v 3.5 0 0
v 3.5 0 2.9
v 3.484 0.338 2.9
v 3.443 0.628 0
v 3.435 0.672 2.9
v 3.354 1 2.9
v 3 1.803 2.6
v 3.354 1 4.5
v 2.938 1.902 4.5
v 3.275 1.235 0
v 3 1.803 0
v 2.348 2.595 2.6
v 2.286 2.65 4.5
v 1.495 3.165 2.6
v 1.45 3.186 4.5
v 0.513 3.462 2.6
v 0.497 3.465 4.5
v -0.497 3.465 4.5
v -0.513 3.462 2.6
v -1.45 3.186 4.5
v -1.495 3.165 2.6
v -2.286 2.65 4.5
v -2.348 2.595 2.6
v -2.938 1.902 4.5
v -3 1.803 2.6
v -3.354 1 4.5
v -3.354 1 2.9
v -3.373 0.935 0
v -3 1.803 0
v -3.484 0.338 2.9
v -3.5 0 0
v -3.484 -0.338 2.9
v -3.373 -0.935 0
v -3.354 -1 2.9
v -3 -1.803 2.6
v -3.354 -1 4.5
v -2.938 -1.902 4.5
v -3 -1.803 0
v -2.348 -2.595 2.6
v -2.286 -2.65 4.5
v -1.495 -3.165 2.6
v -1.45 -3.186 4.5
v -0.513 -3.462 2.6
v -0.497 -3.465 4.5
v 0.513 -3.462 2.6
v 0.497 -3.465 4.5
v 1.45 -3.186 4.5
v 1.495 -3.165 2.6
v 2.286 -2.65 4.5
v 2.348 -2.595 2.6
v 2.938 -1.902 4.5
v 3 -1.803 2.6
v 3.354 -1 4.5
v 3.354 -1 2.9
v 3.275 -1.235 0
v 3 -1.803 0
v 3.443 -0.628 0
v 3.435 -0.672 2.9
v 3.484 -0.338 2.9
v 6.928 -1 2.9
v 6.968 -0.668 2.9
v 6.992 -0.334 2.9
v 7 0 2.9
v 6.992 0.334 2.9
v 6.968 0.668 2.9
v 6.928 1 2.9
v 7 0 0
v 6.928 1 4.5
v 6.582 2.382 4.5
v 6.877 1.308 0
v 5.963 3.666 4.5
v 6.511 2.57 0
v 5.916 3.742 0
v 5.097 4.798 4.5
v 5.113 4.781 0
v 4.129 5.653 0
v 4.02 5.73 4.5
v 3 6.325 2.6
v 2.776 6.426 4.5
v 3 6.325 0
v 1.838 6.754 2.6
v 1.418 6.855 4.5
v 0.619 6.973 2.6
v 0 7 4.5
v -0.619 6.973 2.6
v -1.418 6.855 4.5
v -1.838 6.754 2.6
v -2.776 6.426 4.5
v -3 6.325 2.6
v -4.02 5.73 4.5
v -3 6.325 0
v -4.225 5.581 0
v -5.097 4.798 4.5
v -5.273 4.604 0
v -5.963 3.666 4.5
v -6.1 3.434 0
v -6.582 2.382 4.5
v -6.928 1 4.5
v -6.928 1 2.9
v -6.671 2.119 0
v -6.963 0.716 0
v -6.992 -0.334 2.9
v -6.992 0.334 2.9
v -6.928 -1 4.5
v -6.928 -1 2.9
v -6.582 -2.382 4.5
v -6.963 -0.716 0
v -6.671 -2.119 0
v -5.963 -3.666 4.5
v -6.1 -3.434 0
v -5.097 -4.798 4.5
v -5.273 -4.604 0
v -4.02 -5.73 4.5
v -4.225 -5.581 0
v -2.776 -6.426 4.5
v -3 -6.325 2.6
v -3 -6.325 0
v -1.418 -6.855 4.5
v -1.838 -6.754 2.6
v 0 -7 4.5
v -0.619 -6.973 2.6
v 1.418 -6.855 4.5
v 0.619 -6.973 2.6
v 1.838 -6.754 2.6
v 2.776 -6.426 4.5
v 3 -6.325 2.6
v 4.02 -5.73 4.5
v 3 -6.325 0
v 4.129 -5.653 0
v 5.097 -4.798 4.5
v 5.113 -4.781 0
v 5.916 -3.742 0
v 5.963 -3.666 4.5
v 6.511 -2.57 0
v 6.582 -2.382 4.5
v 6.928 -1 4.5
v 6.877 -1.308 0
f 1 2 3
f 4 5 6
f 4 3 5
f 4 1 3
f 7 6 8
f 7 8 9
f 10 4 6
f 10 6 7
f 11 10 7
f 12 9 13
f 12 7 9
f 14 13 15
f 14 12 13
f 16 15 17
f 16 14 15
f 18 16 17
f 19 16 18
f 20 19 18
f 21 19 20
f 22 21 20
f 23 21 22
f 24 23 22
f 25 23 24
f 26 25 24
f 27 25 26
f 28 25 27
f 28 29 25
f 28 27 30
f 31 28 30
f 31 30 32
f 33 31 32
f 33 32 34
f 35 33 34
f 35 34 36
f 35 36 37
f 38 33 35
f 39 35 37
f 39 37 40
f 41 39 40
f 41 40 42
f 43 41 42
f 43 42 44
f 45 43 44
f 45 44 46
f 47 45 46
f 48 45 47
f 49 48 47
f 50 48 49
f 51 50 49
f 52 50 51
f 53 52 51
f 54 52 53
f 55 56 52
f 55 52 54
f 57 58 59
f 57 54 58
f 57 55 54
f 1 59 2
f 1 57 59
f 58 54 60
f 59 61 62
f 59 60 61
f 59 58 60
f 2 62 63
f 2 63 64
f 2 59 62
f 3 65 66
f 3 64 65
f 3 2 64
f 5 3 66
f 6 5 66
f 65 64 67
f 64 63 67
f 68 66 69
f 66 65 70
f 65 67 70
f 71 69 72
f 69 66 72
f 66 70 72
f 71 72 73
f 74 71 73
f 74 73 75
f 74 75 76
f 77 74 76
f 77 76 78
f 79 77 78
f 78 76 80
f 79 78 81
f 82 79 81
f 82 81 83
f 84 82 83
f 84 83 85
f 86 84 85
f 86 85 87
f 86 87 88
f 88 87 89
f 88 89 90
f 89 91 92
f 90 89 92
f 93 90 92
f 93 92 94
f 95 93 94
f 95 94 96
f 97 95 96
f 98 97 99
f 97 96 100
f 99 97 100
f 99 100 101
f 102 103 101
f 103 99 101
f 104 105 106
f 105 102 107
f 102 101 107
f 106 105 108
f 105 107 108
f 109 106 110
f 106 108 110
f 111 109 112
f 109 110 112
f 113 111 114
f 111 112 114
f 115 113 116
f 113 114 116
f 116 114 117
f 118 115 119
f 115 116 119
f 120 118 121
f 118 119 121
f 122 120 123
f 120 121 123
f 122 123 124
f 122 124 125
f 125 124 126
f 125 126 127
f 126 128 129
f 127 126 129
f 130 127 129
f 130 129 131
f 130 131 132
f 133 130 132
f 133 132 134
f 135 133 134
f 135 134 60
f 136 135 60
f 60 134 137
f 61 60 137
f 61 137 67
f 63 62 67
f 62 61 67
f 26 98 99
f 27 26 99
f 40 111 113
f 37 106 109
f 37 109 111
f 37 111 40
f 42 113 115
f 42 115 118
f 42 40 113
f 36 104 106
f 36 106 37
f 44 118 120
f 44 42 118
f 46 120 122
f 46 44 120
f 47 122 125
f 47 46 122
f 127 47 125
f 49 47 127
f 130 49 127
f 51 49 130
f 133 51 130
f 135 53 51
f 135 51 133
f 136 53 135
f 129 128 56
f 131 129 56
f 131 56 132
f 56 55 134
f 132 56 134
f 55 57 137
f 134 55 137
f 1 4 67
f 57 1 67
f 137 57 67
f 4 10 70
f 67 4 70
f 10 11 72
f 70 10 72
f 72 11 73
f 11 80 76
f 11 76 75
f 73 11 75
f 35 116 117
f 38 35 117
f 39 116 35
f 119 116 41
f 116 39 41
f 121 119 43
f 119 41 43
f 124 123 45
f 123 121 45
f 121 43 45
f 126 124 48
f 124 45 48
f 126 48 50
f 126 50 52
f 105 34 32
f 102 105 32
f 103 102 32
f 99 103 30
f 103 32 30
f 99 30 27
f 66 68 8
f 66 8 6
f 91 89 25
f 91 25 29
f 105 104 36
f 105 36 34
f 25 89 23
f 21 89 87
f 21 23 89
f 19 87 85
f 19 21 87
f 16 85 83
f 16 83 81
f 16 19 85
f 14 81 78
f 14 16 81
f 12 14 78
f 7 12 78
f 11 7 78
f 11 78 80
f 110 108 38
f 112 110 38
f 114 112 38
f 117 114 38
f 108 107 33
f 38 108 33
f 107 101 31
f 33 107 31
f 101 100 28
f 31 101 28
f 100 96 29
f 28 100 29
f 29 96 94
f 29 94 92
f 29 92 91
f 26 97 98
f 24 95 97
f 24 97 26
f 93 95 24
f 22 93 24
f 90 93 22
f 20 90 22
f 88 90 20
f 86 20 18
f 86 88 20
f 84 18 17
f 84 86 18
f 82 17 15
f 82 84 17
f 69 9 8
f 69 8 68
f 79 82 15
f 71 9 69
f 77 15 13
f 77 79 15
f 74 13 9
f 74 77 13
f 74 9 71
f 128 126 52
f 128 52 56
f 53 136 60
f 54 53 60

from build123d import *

# Parameters (mm, degrees)
SKETCH_1_R               = 7
SKETCH_1_R_2             = 3.5
EXTRUDE_1_DEPTH          = 4.5
SKETCH_2_W               = 6
SKETCH_2_H               = 2.6
CUT_EXTRUDE_1_DEPTH      = 8
CUT_EXTRUDE_1_DEPTH_BACK = 8
SKETCH_3_W               = 1.6
SKETCH_3_H               = 2
CUT_EXTRUDE_2_DEPTH      = 8
CUT_EXTRUDE_2_DEPTH_BACK = 8


with BuildPart() as part:
    # Эскиз1 → Бобышка-Вытянуть1 (new body)
    with BuildSketch(Plane.XY):
        Circle(SKETCH_1_R)
        Circle(SKETCH_1_R_2, mode=Mode.SUBTRACT)
    extrude(amount=EXTRUDE_1_DEPTH)

    # Эскиз2 → Вырез-Вытянуть1 (cut, two sides)
    with BuildSketch(Plane(origin=(0, 0, 0), x_dir=(1, 0, 0), z_dir=(0, 1, 0))) as cut_extrude_1_sk:
        with Locations((0, -1.3)):
            Rectangle(SKETCH_2_W, SKETCH_2_H)
    extrude(amount=CUT_EXTRUDE_1_DEPTH, mode=Mode.SUBTRACT)
    extrude(cut_extrude_1_sk.sketch, amount=-CUT_EXTRUDE_1_DEPTH_BACK, mode=Mode.SUBTRACT)

    # Эскиз3 → Вырез-Вытянуть2 (cut, two sides)
    with BuildSketch(Plane(origin=(0, 0, 0), x_dir=(0, 0, -1), z_dir=(1, 0, 0))) as cut_extrude_2_sk:
        with Locations((-3.7, 0)):
            Rectangle(SKETCH_3_W, SKETCH_3_H)
    extrude(amount=CUT_EXTRUDE_2_DEPTH, mode=Mode.SUBTRACT)
    extrude(cut_extrude_2_sk.sketch, amount=-CUT_EXTRUDE_2_DEPTH_BACK, mode=Mode.SUBTRACT)


solid = part.part
